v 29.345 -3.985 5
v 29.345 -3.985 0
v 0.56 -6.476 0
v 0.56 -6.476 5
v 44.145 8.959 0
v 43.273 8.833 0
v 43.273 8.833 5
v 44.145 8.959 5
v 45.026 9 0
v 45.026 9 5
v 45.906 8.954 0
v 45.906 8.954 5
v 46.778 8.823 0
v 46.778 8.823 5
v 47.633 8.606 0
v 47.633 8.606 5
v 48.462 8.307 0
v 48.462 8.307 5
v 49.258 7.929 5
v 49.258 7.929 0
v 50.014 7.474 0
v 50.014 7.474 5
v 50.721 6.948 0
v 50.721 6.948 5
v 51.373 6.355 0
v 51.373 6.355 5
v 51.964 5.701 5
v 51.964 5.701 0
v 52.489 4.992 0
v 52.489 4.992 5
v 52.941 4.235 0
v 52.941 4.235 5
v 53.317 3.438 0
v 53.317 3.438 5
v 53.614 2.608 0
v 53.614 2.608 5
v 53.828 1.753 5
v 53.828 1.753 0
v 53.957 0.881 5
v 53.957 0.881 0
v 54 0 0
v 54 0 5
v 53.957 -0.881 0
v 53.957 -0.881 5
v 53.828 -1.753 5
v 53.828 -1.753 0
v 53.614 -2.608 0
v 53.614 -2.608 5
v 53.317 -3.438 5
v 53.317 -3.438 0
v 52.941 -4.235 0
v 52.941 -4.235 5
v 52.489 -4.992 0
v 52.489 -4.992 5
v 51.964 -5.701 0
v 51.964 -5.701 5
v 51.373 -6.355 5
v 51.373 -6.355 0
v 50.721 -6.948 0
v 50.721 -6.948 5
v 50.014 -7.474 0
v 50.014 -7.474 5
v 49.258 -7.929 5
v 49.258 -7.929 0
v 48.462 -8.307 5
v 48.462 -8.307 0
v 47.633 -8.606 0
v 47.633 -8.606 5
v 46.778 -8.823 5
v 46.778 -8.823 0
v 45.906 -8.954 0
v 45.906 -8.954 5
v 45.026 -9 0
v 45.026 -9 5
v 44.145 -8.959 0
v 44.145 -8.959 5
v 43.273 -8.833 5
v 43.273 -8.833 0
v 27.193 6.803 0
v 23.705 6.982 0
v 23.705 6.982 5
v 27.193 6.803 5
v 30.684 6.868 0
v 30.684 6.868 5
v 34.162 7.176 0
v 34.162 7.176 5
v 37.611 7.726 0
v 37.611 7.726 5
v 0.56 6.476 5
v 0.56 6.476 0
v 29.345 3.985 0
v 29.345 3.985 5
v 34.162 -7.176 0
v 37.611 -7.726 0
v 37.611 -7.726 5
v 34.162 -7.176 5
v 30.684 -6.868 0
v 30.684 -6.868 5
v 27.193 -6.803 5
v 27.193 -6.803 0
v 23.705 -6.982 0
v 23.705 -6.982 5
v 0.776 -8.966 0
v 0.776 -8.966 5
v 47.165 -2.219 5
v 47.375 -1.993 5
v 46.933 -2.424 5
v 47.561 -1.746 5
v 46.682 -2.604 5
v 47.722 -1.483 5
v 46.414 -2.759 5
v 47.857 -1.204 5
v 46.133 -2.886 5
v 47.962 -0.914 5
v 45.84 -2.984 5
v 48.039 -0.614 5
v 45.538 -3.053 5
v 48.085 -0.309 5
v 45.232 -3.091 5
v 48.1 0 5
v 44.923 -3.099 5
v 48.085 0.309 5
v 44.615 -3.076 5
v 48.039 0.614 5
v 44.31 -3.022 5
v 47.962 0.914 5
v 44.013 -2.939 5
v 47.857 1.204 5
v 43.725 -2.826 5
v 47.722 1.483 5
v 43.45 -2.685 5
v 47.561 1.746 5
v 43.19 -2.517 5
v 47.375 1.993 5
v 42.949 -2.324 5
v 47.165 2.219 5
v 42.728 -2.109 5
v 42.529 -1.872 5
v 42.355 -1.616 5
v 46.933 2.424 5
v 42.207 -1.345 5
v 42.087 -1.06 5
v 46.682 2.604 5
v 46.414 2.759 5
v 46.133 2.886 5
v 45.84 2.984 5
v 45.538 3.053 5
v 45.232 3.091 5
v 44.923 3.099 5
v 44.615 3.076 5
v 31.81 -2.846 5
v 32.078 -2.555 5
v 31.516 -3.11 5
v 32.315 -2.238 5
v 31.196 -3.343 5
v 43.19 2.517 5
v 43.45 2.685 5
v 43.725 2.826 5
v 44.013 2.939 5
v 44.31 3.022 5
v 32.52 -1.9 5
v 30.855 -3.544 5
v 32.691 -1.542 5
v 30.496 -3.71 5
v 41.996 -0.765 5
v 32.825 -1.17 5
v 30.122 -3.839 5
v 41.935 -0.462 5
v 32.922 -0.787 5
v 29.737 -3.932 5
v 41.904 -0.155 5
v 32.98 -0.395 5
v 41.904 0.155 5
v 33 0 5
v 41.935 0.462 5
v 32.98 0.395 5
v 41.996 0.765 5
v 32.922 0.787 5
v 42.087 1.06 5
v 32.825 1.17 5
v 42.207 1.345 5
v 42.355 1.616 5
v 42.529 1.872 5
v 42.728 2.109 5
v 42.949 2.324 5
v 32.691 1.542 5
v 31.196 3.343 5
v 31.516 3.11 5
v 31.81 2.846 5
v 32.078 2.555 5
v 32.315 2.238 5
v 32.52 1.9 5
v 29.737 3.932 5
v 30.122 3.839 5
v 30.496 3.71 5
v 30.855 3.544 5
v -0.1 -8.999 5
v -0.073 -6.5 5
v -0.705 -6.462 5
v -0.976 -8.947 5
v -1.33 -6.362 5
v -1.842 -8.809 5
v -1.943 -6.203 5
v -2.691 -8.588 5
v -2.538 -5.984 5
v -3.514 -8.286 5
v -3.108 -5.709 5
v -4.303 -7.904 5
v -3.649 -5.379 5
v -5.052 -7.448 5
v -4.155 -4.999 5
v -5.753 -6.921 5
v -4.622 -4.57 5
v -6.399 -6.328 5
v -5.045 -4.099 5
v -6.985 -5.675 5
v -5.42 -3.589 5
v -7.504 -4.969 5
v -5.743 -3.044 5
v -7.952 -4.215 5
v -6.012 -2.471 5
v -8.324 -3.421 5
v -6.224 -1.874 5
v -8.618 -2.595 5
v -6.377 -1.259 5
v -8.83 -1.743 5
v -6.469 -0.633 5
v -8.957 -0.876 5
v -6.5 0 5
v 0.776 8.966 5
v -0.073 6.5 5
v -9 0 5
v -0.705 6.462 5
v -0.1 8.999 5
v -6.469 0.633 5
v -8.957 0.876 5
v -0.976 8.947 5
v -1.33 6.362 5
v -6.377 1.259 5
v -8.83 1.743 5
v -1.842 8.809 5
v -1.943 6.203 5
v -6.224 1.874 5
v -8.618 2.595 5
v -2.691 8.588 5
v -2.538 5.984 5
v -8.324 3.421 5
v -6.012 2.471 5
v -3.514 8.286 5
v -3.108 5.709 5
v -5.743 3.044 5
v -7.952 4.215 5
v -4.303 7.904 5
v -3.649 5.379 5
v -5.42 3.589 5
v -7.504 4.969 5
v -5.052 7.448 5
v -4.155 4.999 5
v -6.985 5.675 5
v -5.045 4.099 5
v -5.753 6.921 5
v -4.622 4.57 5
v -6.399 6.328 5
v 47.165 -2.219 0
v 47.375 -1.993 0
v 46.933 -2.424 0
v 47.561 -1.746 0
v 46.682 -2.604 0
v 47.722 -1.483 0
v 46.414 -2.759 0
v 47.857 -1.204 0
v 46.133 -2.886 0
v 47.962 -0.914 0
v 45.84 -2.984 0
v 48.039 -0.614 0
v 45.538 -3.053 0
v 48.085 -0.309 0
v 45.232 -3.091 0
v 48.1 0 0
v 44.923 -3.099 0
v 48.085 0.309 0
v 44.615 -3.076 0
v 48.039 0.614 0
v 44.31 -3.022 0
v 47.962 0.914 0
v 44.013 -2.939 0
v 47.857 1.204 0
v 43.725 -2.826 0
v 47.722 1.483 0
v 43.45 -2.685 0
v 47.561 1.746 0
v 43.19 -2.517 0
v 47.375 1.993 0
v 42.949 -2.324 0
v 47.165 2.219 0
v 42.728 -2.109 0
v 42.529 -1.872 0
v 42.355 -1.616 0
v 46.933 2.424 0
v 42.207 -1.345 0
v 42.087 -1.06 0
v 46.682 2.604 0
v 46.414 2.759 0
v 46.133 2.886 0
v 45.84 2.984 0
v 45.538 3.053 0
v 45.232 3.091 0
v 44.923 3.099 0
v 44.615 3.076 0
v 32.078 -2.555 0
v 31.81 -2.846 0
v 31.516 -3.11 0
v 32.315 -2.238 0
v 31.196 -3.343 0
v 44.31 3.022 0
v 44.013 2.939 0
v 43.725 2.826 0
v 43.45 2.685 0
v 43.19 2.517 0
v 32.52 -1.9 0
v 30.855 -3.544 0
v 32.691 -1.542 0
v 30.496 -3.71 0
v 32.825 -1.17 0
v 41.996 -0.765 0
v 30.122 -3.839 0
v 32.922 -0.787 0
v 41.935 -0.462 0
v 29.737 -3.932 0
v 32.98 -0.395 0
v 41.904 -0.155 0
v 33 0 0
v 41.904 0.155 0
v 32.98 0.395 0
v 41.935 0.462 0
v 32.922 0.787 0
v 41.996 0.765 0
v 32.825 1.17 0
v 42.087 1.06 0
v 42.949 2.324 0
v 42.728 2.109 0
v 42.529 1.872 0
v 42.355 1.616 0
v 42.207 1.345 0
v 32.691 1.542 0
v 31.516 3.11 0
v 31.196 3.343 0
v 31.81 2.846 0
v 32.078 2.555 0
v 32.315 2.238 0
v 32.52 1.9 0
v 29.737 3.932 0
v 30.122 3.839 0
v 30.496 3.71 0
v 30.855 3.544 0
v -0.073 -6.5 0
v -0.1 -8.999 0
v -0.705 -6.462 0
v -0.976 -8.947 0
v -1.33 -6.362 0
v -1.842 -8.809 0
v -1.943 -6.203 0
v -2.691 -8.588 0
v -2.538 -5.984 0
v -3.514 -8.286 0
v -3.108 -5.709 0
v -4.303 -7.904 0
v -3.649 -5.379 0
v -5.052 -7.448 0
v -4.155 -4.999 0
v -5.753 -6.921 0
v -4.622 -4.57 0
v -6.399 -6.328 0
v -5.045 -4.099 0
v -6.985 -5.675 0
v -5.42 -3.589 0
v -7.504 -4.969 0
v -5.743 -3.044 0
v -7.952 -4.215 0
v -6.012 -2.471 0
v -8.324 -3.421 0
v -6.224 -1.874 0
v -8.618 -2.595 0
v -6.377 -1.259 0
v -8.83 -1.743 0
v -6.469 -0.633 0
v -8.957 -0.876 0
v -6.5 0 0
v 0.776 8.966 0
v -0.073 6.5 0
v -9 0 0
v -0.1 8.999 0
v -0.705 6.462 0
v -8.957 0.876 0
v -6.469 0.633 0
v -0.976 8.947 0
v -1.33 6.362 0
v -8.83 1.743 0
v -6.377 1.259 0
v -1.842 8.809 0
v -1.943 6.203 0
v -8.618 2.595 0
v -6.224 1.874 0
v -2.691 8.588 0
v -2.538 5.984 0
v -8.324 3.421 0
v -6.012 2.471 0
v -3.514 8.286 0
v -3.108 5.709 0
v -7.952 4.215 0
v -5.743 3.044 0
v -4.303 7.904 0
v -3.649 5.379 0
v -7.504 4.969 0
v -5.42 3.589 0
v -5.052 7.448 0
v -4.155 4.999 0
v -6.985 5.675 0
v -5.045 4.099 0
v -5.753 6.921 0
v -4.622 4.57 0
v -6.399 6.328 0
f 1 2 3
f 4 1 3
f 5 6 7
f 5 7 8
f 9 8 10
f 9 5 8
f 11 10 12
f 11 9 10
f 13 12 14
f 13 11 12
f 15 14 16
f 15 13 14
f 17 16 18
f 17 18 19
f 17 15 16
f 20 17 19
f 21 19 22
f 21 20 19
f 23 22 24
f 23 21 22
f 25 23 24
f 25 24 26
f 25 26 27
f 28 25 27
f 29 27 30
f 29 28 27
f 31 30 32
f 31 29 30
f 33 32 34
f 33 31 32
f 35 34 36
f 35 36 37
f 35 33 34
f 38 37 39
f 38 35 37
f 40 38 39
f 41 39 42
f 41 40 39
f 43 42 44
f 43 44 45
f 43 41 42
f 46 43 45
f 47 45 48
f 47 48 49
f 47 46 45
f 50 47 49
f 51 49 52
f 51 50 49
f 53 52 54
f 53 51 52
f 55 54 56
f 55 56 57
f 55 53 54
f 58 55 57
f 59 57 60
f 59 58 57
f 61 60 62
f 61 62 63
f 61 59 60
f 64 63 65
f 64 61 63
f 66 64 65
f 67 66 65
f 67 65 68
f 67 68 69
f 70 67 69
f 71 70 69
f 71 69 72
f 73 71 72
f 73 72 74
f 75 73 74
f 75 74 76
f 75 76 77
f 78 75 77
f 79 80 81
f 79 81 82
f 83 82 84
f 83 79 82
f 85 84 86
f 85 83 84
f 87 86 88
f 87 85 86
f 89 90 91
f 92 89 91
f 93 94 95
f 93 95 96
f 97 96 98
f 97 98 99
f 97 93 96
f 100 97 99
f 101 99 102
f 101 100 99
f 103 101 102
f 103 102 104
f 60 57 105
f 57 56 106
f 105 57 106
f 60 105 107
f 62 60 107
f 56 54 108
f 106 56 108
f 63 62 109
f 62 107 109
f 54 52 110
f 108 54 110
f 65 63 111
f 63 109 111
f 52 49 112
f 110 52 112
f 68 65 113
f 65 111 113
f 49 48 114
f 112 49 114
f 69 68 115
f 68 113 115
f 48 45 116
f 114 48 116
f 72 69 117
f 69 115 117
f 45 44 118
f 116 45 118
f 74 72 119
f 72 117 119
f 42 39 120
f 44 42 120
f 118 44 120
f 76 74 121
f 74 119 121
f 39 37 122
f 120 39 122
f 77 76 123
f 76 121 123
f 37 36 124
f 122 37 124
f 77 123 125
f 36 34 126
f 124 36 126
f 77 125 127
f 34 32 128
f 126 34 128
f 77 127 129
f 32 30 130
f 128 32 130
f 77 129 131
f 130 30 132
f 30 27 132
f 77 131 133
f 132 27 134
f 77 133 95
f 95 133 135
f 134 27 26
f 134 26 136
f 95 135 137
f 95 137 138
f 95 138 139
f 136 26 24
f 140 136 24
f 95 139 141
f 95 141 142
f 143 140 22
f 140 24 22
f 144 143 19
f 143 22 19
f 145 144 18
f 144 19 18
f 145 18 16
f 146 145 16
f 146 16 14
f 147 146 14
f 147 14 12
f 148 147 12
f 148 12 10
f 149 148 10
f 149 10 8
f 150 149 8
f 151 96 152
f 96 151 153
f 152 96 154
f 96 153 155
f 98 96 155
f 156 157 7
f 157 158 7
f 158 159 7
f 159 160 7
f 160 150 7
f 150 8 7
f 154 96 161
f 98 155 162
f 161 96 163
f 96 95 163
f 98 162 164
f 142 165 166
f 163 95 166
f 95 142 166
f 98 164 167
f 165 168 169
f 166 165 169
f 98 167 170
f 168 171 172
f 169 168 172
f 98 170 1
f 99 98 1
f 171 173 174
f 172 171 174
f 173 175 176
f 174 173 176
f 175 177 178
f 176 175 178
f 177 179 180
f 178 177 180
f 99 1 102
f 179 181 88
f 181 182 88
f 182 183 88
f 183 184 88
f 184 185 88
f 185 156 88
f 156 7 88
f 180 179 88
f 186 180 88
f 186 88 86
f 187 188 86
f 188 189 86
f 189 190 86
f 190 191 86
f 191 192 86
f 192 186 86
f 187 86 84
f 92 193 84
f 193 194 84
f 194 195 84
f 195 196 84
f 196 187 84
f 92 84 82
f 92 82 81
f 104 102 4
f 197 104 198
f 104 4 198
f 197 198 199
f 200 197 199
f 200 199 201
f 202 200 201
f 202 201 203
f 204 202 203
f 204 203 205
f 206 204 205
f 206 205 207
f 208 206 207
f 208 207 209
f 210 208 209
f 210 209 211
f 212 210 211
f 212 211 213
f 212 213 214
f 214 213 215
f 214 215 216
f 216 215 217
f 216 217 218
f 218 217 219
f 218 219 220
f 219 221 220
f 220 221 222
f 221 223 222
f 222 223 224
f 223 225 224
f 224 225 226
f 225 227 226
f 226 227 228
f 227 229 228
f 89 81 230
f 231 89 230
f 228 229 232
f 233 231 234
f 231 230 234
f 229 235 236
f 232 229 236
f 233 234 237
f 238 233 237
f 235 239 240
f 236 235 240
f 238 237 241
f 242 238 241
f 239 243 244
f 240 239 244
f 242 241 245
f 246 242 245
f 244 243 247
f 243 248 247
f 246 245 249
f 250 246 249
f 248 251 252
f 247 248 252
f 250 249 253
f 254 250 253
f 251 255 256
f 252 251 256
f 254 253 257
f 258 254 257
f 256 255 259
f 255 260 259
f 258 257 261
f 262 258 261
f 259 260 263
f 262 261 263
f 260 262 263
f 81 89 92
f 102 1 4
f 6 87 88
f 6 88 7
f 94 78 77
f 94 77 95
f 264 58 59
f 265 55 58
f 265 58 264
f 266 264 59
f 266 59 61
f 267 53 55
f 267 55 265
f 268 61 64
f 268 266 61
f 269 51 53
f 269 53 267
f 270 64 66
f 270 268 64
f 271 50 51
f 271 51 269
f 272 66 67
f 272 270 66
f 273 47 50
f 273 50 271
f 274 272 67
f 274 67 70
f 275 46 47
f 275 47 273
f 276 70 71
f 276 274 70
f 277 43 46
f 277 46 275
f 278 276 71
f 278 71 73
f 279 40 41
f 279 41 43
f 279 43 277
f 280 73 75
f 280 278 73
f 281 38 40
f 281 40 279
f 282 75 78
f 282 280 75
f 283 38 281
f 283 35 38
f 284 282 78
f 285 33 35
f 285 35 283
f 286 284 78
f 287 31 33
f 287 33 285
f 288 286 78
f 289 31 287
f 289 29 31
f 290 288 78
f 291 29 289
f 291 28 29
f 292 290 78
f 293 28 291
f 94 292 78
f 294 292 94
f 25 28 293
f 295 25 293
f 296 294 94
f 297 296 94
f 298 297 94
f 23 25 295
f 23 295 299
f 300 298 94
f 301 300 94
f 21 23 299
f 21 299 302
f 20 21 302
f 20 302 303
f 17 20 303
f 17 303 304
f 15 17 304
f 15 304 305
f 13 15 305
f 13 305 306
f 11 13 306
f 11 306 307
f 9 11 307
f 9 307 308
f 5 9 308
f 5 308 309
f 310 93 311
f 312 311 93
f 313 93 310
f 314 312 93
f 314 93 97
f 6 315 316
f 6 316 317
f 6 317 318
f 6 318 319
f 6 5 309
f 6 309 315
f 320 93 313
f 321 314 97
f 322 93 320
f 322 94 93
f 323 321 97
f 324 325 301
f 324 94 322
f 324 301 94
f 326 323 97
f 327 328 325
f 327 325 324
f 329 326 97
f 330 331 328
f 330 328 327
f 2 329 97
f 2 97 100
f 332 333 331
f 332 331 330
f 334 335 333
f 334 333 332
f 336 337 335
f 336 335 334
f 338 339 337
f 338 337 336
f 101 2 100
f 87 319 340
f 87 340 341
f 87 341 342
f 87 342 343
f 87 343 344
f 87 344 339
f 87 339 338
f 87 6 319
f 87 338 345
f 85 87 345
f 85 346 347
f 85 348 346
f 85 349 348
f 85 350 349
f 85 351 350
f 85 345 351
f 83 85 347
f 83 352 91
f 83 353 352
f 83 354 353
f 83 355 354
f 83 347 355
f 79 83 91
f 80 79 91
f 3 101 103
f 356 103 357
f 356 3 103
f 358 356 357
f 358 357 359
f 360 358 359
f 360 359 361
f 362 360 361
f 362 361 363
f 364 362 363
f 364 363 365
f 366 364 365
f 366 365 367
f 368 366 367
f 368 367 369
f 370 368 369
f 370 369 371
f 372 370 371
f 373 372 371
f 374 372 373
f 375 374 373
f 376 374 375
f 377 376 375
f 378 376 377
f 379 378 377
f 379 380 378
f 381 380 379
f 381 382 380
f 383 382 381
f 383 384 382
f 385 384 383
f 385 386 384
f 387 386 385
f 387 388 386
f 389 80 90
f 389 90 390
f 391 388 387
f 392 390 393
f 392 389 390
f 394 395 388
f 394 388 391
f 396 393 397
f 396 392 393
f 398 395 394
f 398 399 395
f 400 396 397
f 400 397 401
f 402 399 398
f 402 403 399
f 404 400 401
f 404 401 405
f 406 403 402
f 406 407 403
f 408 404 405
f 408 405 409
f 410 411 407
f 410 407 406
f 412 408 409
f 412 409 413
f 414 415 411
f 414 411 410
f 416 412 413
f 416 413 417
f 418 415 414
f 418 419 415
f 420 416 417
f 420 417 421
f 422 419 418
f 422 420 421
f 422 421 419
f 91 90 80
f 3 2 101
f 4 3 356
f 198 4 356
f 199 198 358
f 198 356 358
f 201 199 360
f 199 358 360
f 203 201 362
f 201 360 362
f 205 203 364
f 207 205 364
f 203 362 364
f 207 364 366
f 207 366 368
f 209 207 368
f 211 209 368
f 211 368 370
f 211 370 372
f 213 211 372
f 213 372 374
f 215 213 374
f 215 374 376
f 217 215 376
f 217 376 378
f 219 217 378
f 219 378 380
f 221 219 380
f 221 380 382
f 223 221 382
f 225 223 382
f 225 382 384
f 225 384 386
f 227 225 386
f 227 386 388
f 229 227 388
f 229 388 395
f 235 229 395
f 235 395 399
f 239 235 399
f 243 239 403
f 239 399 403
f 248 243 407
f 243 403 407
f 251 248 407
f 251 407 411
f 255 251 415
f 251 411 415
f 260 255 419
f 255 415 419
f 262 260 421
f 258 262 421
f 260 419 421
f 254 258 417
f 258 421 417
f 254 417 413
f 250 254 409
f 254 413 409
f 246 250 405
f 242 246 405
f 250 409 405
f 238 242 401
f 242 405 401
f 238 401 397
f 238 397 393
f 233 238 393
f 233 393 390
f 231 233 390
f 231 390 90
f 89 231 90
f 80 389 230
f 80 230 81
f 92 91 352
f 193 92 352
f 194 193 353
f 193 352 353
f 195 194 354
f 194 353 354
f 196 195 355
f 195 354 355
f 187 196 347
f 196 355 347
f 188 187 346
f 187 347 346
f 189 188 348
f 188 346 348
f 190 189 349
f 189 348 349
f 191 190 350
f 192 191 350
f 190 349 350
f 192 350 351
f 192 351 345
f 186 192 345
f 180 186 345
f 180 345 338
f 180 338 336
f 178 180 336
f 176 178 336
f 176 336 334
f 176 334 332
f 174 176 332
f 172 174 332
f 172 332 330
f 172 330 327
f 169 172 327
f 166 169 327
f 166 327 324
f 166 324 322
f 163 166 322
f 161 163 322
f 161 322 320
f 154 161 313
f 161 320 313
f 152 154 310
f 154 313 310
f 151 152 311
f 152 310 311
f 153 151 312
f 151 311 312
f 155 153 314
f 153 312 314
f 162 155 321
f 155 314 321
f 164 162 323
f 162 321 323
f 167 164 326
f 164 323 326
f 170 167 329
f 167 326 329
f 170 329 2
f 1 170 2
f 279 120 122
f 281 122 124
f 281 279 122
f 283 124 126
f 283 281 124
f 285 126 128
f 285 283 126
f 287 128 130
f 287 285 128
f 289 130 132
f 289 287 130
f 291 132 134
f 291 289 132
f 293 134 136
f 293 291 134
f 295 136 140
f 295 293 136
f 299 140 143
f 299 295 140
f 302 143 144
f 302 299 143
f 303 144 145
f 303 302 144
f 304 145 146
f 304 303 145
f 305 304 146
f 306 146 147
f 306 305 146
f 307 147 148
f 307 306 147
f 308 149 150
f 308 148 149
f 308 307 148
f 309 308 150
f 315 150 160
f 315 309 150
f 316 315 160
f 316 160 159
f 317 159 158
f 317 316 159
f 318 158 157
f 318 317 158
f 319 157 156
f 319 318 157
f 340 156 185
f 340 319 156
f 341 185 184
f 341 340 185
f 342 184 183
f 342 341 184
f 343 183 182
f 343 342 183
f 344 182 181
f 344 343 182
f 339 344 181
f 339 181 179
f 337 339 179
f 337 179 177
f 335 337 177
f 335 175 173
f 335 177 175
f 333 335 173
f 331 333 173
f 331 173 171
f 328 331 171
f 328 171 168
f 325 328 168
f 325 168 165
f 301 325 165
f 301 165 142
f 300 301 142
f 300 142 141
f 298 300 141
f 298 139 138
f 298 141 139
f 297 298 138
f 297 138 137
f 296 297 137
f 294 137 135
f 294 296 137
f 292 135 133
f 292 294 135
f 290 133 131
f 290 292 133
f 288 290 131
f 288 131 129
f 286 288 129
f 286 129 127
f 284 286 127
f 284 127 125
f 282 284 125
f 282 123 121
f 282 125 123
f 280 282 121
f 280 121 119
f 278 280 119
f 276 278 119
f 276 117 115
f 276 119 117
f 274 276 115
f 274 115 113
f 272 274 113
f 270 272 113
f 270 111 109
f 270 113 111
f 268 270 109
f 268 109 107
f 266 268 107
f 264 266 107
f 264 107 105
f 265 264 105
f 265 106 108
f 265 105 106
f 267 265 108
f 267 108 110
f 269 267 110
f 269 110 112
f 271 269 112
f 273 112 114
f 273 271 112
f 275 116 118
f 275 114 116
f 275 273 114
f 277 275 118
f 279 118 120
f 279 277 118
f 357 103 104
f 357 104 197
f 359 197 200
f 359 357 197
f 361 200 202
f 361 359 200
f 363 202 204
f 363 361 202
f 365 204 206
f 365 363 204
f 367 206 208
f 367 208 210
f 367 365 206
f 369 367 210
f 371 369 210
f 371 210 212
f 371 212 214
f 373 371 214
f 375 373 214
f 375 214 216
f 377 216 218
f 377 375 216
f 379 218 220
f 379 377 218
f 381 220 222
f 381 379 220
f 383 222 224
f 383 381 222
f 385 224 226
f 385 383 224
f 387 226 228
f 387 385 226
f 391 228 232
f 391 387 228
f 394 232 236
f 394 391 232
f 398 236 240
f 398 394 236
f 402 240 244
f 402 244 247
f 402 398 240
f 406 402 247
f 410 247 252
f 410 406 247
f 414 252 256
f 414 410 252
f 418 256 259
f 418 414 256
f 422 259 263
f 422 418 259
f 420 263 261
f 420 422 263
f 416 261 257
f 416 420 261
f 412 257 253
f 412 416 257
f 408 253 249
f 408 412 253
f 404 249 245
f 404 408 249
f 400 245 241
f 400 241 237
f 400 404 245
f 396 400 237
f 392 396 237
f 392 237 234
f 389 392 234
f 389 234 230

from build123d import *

# Parameters (mm, degrees)
TIJELO_DEPTH       = 5
UTOR_ZA_RUKU_DEPTH = 55.972720508
SKETCH8_R          = 3.1
CUT_EXTRUDE2_DEPTH = 10


with BuildPart() as part:
    # Sketch2 → Tijelo (new body)
    with BuildSketch(Plane.XY):
        with BuildLine():
            Line((0.775862069, 8.966495305), (23.705382946, 6.98242629))
            ThreePointArc((23.705382946, 6.98242629), (30.68412811, 6.867543469), (37.610875669, 7.725593798))
            Line((37.610875669, 7.725593798), (43.272873379, 8.832725153))
            ThreePointArc((43.272873379, 8.832725153), (54, 0), (43.272873379, -8.832725153))
            Line((43.272873379, -8.832725153), (37.610875669, -7.725593798))
            ThreePointArc((37.610875669, -7.725593798), (30.68412811, -6.867543469), (23.705382946, -6.98242629))
            Line((23.705382946, -6.98242629), (0.775862069, -8.966495305))
            ThreePointArc((0.775862069, -8.966495305), (-9, 0), (0.775862069, 8.966495305))
        make_face()
    extrude(amount=TIJELO_DEPTH)

    # Sketch1 → Utor za ruku (cut, through all)
    with BuildSketch(Plane.XY):
        with BuildLine():
            Line((0.560344828, 6.475802165), (29.344827586, 3.985109024))
            ThreePointArc((29.344827586, 3.985109024), (33, 0), (29.344827586, -3.985109024))
            Line((29.344827586, -3.985109024), (0.560344828, -6.475802165))
            ThreePointArc((0.560344828, -6.475802165), (-6.5, 0), (0.560344828, 6.475802165))
        make_face()
    extrude(amount=UTOR_ZA_RUKU_DEPTH, mode=Mode.SUBTRACT)

    # Sketch8 → Cut-Extrude2 (cut)
    with BuildSketch(Plane.XY):
        with Locations((45, 0)):
            Circle(SKETCH8_R)
    extrude(amount=CUT_EXTRUDE2_DEPTH, mode=Mode.SUBTRACT)


solid = part.part
